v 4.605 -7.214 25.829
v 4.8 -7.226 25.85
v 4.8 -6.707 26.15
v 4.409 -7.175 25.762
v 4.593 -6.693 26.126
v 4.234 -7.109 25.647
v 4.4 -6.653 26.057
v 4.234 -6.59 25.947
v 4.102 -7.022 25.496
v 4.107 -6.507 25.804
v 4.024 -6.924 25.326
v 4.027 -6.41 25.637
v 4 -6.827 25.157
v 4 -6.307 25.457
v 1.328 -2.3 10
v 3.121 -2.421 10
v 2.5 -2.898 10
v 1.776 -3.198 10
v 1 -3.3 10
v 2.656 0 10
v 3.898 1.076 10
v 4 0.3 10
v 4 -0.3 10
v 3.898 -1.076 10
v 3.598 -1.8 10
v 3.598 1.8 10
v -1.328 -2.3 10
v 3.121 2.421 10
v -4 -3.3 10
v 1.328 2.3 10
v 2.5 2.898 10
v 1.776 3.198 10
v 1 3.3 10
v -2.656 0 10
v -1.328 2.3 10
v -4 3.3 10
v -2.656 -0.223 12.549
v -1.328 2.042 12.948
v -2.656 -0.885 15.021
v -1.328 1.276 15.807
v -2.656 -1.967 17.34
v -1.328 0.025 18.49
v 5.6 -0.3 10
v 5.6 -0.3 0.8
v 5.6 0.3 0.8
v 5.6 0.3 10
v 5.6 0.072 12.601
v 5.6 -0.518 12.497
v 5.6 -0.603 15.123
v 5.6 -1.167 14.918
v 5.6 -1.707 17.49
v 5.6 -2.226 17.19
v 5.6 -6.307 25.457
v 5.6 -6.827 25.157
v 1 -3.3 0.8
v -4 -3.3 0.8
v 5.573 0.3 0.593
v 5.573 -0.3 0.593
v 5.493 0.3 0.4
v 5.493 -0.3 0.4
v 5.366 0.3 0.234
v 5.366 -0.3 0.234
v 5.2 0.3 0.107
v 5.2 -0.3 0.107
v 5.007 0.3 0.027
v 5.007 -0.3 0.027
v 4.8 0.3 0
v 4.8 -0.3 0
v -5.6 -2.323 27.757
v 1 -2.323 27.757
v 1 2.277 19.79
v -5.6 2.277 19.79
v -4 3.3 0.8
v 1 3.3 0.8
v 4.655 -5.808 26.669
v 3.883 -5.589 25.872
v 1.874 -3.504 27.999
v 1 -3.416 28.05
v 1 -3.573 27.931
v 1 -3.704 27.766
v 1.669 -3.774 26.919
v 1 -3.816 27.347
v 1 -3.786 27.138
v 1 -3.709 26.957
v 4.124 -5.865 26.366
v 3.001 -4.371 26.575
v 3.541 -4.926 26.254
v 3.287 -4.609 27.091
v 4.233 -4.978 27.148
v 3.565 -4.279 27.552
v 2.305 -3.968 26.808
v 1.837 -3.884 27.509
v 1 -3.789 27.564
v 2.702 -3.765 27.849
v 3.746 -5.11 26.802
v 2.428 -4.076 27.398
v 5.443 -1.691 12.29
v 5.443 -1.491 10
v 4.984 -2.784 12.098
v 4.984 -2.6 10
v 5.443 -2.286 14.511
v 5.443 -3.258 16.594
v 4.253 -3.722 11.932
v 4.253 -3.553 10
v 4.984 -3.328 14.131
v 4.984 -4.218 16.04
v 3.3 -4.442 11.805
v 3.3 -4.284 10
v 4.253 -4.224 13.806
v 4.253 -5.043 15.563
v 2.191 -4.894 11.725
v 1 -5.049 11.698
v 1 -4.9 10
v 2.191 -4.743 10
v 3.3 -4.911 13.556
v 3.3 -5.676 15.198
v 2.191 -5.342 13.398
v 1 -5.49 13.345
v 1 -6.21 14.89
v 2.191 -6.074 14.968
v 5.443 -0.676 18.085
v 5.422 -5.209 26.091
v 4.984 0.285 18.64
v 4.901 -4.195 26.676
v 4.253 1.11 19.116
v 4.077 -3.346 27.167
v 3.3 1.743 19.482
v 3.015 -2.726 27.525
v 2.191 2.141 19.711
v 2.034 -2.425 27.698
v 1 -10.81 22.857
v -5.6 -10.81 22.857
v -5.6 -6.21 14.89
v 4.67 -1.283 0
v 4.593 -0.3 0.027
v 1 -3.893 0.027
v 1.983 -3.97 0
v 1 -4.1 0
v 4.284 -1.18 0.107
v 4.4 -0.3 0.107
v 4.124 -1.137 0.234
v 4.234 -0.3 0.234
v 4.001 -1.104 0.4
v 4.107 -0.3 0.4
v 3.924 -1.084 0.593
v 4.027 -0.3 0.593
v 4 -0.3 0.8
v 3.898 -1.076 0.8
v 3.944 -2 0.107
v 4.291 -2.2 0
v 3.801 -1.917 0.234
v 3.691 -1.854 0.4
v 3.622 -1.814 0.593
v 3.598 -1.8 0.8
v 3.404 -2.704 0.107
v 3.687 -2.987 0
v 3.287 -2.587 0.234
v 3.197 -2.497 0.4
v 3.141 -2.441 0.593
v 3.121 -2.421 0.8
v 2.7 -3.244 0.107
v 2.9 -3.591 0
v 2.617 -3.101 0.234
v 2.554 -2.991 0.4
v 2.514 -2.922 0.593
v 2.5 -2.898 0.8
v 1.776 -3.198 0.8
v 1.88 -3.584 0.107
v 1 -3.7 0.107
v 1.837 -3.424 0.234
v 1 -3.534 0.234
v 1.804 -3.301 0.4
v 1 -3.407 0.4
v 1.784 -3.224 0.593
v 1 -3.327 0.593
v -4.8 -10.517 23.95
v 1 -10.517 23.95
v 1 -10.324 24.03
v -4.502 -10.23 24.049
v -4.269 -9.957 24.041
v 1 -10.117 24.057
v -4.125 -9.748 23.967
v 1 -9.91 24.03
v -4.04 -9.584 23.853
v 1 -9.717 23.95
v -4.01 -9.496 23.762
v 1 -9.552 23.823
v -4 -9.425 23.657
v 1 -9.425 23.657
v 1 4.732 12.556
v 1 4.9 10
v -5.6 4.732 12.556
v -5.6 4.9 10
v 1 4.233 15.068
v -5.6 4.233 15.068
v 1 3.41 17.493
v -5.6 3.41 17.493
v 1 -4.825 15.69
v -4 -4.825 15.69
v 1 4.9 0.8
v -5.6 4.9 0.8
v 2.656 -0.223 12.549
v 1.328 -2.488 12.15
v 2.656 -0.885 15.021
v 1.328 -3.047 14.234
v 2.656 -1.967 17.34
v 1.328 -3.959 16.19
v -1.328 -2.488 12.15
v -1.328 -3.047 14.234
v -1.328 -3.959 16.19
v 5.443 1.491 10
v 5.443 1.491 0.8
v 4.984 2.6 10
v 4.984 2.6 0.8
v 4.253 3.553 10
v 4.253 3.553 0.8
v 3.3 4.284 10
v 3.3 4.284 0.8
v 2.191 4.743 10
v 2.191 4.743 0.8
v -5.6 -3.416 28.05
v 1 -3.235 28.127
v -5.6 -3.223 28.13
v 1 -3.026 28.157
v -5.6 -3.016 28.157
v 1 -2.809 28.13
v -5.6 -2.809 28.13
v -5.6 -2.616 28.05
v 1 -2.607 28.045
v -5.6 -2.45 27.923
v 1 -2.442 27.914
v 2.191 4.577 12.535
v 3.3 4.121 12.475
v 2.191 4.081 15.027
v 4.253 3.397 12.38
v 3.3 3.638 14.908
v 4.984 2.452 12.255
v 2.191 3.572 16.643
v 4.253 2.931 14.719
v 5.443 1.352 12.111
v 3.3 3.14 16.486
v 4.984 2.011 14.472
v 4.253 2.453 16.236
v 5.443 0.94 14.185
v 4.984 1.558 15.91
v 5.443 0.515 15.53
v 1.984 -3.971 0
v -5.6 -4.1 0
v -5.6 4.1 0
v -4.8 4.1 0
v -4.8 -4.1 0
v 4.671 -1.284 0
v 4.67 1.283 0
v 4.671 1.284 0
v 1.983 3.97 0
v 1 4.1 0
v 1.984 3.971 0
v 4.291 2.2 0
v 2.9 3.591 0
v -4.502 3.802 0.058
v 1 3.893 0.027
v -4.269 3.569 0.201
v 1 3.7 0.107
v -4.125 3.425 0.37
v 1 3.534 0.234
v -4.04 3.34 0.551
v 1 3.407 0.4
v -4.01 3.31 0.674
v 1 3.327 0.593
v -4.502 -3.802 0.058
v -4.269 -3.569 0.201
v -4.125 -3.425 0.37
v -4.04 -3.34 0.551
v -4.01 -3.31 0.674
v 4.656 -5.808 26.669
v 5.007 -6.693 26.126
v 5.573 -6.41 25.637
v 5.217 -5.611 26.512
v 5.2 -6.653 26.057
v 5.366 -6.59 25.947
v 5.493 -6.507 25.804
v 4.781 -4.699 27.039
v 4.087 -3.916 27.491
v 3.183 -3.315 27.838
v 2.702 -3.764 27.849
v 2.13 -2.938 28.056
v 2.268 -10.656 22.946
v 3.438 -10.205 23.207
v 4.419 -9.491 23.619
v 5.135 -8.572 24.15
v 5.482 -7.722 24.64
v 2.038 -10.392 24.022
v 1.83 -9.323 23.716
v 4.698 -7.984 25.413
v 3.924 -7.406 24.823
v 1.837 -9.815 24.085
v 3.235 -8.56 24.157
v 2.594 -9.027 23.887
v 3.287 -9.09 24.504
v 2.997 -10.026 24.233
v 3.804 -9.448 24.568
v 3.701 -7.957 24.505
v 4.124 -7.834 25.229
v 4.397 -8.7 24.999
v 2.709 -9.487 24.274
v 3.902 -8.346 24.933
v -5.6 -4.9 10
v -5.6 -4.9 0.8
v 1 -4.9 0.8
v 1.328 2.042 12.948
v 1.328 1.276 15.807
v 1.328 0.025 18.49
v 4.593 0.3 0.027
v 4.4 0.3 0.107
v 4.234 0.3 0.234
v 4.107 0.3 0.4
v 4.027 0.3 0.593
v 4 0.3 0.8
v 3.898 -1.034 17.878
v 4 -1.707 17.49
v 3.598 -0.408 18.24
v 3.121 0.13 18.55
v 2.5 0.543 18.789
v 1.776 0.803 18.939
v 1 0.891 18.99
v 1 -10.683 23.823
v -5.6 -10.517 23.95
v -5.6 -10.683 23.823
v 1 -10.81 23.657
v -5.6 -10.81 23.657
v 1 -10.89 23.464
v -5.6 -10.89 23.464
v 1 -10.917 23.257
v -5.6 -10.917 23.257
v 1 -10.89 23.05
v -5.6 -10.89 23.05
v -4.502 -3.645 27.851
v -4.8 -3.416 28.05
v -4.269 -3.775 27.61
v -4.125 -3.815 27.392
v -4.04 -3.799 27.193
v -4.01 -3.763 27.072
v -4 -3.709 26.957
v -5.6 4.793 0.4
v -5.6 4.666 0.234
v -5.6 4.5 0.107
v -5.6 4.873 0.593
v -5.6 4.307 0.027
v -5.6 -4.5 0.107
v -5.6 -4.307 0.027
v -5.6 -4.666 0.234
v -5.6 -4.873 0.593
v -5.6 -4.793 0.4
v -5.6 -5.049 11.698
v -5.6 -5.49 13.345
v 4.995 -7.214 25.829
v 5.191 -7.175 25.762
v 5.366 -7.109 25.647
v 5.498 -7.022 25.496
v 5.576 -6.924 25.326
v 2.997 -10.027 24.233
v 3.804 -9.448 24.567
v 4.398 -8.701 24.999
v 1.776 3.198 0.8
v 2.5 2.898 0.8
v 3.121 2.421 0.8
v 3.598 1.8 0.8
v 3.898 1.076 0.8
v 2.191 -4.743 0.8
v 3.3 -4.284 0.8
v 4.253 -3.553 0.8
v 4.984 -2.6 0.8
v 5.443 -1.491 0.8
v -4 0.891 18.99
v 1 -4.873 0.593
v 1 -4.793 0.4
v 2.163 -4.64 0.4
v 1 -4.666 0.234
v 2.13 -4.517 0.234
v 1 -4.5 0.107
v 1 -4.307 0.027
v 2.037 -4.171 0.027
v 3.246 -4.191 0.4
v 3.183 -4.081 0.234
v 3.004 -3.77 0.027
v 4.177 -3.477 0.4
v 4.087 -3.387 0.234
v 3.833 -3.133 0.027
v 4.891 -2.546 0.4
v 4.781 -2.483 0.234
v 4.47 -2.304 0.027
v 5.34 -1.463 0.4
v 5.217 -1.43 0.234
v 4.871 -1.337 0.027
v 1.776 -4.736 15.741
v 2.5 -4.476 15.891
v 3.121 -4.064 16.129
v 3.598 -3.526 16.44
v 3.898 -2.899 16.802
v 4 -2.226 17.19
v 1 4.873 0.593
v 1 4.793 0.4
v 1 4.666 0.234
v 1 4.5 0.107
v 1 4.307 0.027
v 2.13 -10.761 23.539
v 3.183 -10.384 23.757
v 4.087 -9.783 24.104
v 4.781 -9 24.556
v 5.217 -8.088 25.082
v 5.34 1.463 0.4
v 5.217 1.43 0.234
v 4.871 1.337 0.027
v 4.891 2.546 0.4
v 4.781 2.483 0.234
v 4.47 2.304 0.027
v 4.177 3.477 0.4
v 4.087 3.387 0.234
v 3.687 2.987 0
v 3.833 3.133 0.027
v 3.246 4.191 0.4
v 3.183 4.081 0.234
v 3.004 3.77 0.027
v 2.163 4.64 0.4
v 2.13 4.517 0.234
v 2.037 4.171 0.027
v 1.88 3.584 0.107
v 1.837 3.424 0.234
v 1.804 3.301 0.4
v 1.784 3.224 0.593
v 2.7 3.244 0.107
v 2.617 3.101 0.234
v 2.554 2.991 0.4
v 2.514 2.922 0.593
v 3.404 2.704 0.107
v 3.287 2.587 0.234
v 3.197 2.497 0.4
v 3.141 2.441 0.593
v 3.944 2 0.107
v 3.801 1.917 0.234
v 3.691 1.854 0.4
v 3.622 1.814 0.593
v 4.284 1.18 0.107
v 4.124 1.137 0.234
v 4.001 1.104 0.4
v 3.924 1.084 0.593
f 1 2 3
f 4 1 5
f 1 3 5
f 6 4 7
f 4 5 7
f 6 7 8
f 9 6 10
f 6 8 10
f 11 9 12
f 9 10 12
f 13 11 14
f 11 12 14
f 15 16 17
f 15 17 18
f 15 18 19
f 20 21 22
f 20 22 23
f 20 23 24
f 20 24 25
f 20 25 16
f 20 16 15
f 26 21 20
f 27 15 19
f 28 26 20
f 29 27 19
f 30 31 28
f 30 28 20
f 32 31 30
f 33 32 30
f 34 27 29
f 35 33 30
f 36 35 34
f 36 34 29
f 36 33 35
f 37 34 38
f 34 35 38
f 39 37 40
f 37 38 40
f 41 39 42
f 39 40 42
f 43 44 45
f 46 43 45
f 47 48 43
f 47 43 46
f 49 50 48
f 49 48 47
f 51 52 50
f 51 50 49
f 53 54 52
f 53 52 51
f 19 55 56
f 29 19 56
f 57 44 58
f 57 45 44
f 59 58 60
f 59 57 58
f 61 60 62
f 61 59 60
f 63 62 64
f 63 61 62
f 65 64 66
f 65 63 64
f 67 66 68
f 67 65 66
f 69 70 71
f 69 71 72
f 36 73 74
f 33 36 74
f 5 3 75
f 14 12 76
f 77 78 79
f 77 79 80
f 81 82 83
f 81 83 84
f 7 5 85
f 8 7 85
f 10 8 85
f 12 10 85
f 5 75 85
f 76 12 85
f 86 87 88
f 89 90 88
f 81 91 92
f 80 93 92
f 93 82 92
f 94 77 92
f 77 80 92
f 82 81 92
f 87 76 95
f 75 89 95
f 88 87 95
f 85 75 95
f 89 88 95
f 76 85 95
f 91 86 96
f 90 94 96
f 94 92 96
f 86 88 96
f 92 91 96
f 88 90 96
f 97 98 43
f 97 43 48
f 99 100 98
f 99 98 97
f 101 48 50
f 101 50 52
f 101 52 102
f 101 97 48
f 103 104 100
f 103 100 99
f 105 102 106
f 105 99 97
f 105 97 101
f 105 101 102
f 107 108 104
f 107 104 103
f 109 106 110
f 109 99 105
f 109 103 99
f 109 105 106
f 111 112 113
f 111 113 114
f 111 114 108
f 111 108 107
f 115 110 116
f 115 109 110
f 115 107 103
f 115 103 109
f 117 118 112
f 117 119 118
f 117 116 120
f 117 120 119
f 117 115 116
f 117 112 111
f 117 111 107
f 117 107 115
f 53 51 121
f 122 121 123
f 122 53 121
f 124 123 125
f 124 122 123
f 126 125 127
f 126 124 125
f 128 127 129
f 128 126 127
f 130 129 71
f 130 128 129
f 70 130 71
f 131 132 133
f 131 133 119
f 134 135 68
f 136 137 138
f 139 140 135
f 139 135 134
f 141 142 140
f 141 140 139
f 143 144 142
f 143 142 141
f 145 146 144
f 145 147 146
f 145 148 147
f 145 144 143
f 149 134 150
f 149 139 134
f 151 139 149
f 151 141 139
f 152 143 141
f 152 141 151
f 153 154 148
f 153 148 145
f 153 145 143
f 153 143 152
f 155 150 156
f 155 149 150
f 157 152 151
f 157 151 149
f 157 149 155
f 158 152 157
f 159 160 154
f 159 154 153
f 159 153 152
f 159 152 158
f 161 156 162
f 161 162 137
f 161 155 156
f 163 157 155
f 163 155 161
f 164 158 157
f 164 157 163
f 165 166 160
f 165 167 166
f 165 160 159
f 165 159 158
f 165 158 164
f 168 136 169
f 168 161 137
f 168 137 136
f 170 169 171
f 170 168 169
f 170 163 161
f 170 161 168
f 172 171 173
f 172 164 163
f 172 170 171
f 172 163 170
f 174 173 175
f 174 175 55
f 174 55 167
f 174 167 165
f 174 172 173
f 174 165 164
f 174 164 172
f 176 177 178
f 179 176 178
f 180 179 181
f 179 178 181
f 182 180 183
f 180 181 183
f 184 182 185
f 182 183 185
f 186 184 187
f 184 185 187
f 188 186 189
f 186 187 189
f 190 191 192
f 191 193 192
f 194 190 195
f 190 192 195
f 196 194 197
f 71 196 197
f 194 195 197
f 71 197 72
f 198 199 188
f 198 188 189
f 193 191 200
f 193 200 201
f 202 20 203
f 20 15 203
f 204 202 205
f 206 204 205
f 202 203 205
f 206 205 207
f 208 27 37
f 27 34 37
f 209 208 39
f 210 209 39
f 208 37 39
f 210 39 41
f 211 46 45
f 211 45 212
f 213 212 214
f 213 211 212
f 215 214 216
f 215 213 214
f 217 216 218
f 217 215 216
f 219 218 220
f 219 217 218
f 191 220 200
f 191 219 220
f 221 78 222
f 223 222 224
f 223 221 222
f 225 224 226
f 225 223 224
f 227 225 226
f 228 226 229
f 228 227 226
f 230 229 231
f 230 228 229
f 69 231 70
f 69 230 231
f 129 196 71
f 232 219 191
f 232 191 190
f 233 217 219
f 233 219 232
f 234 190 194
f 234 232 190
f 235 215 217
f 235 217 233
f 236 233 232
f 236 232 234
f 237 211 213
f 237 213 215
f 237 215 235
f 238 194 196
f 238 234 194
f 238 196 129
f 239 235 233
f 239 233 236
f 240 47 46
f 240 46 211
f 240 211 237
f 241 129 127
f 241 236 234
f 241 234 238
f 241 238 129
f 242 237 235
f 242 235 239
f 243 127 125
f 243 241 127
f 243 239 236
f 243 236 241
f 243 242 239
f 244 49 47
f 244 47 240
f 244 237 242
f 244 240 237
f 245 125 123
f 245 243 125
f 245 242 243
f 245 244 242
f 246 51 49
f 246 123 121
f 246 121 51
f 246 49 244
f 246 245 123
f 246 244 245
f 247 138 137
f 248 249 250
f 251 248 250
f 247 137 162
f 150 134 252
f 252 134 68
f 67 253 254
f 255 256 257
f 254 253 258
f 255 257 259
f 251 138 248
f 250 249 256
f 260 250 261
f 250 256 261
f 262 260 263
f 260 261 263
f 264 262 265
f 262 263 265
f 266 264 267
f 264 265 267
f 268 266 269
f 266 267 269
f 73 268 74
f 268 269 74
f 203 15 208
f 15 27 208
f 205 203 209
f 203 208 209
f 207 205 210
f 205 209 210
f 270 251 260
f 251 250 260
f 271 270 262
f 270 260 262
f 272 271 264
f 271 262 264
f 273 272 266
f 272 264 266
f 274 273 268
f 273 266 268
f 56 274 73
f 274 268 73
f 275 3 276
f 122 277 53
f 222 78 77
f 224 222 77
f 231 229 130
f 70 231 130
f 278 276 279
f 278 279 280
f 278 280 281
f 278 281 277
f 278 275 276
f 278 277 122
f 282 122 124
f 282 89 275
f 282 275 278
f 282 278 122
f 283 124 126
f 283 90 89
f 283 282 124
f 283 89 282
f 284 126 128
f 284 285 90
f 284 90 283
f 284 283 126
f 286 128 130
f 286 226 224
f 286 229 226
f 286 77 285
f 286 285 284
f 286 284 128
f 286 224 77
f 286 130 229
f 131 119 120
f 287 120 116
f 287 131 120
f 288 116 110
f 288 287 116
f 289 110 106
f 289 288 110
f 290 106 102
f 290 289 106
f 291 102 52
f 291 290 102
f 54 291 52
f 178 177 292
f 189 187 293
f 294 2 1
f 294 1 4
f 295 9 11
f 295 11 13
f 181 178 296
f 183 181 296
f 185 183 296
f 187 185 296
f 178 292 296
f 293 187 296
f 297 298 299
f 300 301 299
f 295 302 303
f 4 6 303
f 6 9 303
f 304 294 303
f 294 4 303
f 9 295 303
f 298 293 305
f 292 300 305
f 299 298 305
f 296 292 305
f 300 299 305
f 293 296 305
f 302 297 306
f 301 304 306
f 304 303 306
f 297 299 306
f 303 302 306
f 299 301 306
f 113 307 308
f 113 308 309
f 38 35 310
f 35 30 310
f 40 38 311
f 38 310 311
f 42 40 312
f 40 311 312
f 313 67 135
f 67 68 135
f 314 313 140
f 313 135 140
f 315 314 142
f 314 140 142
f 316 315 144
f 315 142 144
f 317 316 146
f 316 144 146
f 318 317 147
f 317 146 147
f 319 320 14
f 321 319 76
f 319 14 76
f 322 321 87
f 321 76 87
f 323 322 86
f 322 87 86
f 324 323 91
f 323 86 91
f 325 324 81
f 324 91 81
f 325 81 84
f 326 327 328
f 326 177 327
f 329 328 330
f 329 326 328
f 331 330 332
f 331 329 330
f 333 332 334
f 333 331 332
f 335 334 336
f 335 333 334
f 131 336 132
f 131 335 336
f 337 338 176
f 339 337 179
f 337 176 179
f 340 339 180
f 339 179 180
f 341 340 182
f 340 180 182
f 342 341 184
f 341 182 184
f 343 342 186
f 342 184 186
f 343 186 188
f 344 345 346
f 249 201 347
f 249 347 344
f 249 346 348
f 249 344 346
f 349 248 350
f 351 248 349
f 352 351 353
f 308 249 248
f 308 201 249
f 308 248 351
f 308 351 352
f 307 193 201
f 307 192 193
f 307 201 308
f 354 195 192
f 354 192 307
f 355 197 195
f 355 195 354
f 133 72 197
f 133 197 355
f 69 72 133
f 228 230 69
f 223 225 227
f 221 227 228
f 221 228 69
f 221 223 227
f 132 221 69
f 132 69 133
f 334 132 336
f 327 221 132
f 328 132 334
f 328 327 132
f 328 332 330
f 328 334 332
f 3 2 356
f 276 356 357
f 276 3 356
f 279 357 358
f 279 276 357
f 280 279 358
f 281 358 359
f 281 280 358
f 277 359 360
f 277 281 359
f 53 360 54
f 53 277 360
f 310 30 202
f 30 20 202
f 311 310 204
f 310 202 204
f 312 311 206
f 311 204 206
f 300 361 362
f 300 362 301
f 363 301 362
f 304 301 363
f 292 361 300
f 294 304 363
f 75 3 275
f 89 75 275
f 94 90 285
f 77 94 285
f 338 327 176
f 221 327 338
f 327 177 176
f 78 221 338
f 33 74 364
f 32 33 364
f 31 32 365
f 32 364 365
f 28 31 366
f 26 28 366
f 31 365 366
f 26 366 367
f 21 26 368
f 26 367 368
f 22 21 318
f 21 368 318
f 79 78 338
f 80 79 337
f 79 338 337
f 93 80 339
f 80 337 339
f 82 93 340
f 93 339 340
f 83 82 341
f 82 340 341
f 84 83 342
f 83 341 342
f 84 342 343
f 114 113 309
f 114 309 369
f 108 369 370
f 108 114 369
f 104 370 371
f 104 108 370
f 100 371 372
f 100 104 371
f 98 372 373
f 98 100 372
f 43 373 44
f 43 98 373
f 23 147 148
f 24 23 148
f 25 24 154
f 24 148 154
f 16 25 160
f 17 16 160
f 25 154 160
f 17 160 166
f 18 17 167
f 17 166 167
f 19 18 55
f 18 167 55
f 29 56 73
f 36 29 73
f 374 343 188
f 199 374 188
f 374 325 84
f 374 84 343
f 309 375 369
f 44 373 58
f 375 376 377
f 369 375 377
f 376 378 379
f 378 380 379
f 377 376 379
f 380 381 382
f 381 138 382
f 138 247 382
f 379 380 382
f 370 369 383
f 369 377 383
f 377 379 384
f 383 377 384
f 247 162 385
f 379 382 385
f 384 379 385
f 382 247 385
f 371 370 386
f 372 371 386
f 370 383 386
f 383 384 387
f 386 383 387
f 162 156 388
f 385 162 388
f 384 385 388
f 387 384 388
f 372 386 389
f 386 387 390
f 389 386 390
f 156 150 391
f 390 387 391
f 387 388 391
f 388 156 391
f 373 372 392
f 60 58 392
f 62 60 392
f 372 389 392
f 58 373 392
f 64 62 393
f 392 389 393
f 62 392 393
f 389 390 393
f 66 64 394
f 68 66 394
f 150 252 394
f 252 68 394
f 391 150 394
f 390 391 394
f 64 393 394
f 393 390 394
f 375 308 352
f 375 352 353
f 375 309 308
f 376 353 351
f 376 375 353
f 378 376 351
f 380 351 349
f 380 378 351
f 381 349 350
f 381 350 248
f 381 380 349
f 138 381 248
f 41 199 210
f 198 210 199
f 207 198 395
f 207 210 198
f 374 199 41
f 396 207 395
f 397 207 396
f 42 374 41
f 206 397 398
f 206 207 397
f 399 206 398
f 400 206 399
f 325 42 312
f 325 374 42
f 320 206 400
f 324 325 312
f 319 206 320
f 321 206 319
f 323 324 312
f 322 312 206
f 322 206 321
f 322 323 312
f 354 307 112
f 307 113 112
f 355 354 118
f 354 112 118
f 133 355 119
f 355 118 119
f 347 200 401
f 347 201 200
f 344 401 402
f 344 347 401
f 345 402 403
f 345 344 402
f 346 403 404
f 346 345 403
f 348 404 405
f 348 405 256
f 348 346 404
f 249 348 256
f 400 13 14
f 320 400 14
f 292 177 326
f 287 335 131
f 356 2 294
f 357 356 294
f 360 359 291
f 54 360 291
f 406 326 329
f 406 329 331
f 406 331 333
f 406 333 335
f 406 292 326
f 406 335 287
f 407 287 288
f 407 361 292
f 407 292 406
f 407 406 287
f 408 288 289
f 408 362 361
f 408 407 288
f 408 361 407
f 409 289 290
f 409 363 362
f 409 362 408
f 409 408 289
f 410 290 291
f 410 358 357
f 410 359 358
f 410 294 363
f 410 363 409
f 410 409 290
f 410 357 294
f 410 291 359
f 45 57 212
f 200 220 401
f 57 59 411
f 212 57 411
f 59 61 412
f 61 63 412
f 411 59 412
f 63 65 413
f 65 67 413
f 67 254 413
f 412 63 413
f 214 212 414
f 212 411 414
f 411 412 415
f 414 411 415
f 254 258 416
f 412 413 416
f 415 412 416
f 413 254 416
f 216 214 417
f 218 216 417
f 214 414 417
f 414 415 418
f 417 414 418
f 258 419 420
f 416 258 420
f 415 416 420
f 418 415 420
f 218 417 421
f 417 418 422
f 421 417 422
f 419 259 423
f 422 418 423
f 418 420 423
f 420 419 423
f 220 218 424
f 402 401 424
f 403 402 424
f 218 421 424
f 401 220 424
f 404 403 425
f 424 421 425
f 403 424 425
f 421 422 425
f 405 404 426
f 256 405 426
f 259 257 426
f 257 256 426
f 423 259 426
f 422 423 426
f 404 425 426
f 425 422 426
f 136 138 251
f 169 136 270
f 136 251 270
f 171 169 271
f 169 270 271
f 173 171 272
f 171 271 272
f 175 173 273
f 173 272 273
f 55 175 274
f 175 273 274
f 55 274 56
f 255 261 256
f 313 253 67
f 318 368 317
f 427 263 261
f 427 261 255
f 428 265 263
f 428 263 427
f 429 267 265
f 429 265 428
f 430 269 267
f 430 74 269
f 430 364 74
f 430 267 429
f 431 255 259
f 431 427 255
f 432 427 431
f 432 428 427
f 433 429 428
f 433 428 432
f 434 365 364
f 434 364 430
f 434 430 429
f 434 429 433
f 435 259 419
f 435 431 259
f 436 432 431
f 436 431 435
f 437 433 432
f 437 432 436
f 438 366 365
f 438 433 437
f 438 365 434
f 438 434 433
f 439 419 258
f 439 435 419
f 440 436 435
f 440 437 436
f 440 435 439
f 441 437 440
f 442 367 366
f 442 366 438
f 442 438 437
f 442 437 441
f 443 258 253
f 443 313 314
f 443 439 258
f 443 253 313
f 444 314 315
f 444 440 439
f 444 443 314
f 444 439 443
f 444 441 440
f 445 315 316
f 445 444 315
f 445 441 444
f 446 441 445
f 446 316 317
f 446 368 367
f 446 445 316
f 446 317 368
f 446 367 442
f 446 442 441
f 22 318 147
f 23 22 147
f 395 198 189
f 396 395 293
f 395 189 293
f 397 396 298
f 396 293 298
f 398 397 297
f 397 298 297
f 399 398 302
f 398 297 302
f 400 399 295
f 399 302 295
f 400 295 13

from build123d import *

# Parameters (mm, degrees)
CUT_EXTRUDE1_DEPTH = 10
CUT_EXTRUDE2_DEPTH = 10
FILLET1_R          = 0.8


with BuildPart() as part:
    # Sweep1: sweep along a path in Sketch2
    with BuildLine(Plane(origin=(0, 0, 0), x_dir=(0, 0, -1), z_dir=(1, 0, 0))) as sweep1_path:
        Line((0, 0), (-10, 0))
        ThreePointArc((-10, 0), (-13.799332082, -0.500191558), (-17.339745962, -1.966679003))
        Line((-17.339745962, -1.966679003), (-26, -6.966679003))
    # Sketch1 → Sweep1 (sweep)
    with BuildSketch(Plane.XY):
        with BuildLine():
            Line((-5.6, 4.9), (1, 4.9))
            ThreePointArc((1, 4.9), (4.252691193, 3.552691193), (5.6, 0.3))
            Line((5.6, 0.3), (5.6, -0.3))
            ThreePointArc((5.6, -0.3), (4.252691193, -3.552691193), (1, -4.9))
            Line((1, -4.9), (-5.6, -4.9))
            Line((-5.6, -4.9), (-5.6, 4.9))
        make_face()
        Polygon((2.655811238, 0), (1.327905619, 2.3), (-1.327905619, 2.3), (-2.655811238, 0), (-1.327905619, -2.3), (1.327905619, -2.3), align=None, mode=Mode.SUBTRACT)
    sweep(path=sweep1_path.line)

    # Sketch3 → Cut-Extrude1 (cut)
    with BuildSketch(Plane(origin=(0, 0, 0), x_dir=(-1, 0, 0), z_dir=(0, 0, -1))):
        with BuildLine():
            Line((4, -3.3), (4, 3.3))
            Line((4, 3.3), (-1, 3.3))
            ThreePointArc((-1, 3.3), (-3.121320344, 2.421320344), (-4, 0.3))
            Line((-4, 0.3), (-4, -0.3))
            ThreePointArc((-4, -0.3), (-3.121320344, -2.421320344), (-1, -3.3))
            Line((-1, -3.3), (4, -3.3))
        make_face()
    extrude(amount=-CUT_EXTRUDE1_DEPTH, mode=Mode.SUBTRACT)

    # Sketch4 → Cut-Extrude2 (cut)
    with BuildSketch(Plane(origin=(0, -13, 22.516660498), x_dir=(1, 0, 0), z_dir=(0, -0.5000000000000009, 0.8660254037844382))):
        with BuildLine():
            Line((-4, 10.266679003), (-4, 3.666679003))
            Line((-4, 3.666679003), (1, 3.666679003))
            ThreePointArc((1, 3.666679003), (3.121320344, 4.54535866), (4, 6.666679003))
            Line((4, 6.666679003), (4, 7.266679003))
            ThreePointArc((4, 7.266679003), (3.121320344, 9.387999347), (1, 10.266679003))
            Line((1, 10.266679003), (-4, 10.266679003))
        make_face()
    extrude(amount=-CUT_EXTRUDE2_DEPTH, mode=Mode.SUBTRACT)

    # Fillet1
    fillet1_edges = [part.edges().sort_by_distance(p)[0] for p in [
        (-1.5, -4.108795171, 27.65),
        (-4, -6.966679003, 26),
        (-1.5, -9.824562836, 24.35),
        (3.121320344, -9.063603931, 24.789339828),
        (4, -6.966679003, 26),
        (3.121320344, -4.869754075, 27.210660172),
        (-2.3, 4.9, 0),
        (4.252691193, 3.552691193, 0),
        (5.6, 0, 0),
        (4.252691193, -3.552691193, 0),
        (-2.3, -4.9, 0),
        (-2.3, -2.723154525, 28.45),
        (4.252691193, -3.889958178, 27.776345597),
        (5.6, -6.966679003, 26),
        (4.252691193, -10.043399829, 24.223654403),
        (-2.3, -11.210203482, 23.55),
        (-1.5, -3.3, 0),
        (-4, 0, 0),
        (-1.5, 3.3, 0),
        (3.121320344, 2.421320344, 0),
        (4, 0, 0),
        (3.121320344, -2.421320344, 0),
    ]]
    fillet(fillet1_edges, radius=FILLET1_R - 0.0001)  # a hair under: the kernel refuses the full size


solid = part.part
